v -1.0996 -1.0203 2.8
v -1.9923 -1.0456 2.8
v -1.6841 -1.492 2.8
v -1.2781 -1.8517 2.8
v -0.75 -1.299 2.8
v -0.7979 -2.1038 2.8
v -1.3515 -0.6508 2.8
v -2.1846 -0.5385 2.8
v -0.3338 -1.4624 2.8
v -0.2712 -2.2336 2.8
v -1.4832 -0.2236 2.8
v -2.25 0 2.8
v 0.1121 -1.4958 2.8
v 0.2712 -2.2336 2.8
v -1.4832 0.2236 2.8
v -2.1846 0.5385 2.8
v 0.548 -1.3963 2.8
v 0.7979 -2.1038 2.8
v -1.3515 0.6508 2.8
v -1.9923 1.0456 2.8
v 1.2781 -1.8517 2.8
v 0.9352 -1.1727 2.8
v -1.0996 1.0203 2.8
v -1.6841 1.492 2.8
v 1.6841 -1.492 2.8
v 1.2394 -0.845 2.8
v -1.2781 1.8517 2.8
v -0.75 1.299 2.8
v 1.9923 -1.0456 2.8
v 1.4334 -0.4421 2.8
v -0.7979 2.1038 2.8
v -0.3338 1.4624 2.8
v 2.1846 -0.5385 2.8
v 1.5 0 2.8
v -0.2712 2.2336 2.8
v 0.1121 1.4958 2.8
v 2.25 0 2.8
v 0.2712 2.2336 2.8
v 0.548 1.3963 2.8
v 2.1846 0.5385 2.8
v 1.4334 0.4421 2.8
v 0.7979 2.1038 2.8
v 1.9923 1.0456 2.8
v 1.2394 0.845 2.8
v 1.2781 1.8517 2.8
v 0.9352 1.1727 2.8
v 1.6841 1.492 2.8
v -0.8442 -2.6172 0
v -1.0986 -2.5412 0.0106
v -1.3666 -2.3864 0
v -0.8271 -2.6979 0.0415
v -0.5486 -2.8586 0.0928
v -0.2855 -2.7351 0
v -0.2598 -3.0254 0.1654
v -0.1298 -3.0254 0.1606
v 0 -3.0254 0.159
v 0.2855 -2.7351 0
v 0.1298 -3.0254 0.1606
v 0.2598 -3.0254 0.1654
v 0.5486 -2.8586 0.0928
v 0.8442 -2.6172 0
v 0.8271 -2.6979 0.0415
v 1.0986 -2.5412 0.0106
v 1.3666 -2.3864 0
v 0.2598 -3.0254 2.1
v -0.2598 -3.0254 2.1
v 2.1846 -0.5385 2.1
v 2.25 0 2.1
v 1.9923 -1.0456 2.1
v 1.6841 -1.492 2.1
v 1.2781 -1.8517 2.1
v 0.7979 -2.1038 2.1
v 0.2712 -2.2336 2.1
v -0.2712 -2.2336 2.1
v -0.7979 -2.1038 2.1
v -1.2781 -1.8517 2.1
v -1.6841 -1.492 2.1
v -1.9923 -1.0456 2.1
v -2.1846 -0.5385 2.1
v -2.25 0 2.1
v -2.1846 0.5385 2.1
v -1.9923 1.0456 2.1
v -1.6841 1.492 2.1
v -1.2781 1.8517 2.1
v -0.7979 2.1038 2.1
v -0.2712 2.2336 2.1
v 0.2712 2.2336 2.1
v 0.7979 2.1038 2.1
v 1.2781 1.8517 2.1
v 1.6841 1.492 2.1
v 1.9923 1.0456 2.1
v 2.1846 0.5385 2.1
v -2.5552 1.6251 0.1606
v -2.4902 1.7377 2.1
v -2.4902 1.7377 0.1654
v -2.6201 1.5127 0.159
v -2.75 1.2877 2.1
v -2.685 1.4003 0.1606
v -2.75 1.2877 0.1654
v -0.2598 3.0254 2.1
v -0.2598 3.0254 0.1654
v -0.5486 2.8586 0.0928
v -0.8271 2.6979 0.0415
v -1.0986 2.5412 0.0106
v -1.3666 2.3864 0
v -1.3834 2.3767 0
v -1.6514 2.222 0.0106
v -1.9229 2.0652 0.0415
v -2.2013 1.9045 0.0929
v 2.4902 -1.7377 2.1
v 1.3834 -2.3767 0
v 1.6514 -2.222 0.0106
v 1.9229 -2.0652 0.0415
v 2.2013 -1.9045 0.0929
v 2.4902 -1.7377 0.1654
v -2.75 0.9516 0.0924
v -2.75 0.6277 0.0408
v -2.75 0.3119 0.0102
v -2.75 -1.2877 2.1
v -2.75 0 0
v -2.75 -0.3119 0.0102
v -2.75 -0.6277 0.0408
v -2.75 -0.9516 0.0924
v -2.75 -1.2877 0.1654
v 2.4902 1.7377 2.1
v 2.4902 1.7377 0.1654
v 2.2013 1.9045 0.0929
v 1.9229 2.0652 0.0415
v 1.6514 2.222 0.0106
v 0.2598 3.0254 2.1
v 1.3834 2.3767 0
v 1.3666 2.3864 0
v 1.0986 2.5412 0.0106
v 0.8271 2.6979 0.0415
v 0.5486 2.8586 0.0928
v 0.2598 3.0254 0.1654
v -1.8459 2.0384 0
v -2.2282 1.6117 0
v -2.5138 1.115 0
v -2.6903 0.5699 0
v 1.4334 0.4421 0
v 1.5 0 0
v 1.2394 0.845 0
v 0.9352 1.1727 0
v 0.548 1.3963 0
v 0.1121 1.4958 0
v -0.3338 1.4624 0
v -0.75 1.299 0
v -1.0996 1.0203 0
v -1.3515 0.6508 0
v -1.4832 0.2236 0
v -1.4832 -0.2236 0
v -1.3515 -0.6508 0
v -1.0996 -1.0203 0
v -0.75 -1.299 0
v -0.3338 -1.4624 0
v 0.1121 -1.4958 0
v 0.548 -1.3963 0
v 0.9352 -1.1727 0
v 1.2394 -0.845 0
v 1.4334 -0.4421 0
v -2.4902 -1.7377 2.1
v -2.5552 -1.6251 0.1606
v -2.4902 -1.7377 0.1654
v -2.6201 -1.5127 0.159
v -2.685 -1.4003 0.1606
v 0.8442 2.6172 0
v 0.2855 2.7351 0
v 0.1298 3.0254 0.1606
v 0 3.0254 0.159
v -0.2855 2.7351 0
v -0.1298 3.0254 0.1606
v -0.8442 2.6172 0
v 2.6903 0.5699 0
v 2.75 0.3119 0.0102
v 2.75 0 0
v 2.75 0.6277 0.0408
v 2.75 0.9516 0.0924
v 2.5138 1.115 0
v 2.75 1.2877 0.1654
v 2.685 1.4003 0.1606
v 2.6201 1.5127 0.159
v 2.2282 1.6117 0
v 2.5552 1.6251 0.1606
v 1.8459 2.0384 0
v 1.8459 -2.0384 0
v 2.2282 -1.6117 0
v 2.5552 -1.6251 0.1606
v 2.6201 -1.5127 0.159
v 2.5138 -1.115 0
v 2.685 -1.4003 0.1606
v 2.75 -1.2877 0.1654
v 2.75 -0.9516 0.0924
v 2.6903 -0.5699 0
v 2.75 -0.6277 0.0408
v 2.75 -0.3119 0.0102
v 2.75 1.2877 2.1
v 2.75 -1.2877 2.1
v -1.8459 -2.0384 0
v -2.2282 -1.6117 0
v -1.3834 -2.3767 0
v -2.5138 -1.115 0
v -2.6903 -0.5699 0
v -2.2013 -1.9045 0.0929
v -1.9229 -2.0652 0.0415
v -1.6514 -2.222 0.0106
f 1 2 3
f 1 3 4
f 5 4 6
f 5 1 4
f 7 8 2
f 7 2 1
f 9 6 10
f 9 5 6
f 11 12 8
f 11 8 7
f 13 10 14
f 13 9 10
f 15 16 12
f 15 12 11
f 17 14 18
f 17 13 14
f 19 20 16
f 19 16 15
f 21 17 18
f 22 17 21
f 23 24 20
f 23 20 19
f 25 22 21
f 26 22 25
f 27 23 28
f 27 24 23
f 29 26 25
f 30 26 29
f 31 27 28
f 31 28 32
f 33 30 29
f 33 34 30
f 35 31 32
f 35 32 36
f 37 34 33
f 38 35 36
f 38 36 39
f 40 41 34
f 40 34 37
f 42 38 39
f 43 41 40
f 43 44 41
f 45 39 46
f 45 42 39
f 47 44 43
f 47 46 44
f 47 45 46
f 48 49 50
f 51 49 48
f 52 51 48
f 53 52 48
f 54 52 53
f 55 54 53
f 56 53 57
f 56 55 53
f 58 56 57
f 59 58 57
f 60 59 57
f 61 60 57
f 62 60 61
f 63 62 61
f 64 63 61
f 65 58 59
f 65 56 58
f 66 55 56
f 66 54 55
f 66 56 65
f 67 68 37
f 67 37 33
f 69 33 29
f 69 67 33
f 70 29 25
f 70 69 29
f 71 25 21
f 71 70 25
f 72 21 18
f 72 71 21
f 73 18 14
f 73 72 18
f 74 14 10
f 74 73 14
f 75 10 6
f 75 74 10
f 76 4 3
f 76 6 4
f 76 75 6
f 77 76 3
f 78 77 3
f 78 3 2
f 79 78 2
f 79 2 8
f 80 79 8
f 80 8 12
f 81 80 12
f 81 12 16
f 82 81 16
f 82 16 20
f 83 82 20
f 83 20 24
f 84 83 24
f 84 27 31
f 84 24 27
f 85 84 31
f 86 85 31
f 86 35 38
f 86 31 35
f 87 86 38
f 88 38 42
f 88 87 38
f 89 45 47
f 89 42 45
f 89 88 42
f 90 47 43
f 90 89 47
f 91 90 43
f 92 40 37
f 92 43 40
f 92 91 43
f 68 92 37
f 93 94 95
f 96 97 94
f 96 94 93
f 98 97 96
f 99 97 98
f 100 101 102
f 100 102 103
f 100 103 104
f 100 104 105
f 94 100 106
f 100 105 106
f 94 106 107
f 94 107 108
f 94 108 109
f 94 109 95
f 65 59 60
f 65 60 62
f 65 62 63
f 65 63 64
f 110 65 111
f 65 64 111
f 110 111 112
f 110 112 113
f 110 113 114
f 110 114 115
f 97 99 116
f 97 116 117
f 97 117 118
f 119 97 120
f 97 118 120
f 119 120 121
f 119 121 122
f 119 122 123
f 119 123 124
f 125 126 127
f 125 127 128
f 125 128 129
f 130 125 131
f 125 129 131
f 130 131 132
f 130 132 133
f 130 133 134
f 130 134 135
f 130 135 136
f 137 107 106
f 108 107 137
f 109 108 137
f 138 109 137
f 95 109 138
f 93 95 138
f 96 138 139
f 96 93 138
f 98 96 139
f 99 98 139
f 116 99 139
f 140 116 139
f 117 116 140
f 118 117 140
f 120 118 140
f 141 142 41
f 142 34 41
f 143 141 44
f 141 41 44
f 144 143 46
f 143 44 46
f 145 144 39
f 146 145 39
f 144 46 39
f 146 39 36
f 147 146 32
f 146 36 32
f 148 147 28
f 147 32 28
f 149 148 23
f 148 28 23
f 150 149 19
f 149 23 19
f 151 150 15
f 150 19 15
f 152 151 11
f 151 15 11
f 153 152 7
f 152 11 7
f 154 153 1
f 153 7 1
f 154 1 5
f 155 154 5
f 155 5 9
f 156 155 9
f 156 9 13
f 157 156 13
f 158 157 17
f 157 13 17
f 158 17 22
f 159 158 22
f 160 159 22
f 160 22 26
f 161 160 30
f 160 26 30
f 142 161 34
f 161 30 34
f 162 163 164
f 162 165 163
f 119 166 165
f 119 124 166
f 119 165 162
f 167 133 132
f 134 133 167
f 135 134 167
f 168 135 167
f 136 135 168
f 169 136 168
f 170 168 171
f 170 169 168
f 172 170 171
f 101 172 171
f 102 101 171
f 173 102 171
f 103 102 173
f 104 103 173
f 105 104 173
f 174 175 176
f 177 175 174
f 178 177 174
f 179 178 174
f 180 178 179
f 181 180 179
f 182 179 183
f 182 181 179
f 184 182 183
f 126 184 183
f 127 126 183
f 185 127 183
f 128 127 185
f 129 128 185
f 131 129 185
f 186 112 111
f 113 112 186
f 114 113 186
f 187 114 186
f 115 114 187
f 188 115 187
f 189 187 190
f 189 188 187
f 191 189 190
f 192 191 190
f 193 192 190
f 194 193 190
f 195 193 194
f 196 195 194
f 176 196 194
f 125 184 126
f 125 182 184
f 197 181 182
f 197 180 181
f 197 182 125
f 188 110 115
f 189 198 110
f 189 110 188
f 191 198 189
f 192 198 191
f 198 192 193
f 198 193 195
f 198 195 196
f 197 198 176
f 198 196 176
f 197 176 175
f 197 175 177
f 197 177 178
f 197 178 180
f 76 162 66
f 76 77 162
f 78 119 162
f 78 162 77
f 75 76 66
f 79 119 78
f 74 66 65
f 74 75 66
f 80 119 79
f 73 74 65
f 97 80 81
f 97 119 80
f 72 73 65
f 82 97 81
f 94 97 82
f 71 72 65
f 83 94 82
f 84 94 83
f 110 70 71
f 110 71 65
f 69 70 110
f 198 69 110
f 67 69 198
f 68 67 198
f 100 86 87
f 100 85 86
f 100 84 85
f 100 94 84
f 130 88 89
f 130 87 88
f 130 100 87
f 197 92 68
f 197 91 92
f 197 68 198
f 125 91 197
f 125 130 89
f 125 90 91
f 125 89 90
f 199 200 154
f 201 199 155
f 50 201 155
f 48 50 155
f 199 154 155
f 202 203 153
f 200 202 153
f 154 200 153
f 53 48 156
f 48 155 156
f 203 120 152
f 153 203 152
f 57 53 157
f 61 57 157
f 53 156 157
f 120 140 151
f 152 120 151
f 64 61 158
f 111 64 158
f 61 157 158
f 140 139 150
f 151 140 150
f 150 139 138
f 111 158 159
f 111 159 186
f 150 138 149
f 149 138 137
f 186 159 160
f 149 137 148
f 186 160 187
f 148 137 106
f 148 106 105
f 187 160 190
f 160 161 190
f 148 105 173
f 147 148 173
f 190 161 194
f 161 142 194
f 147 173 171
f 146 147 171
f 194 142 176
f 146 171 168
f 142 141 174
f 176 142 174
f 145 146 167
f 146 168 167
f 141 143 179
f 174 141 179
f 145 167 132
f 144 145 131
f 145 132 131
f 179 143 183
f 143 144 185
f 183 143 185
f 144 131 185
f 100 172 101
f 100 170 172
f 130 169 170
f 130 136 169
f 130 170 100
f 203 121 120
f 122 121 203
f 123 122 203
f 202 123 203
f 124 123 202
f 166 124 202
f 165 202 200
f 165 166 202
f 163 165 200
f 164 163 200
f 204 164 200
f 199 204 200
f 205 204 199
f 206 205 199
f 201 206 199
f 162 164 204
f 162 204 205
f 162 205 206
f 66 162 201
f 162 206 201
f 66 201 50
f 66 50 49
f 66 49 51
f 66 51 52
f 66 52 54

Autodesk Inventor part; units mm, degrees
ref_plane "YZ Plane" through (0, 0, 0) normal (1, 0, 0) x (0, 1, 0)
ref_plane "XZ Plane" through (0, 0, 0) normal (0, 1, 0) x (-1, 0, 0)
ref_plane "XY Plane" through (0, 0, 0) normal (0, 0, 1) x (1, 0, 0)
sketch "スケッチ1" plane through (0, 0, 0) normal (0, 1, 0) x (-1, 0, 0)
  line L0 (-1.5, 0) -> (-1.5, 2.8)
  line L1 (-1.5, 2.8) -> (-2.25, 2.8)
  line L2 (-2.25, 2.8) -> (-2.25, 2.1)
  line L3 (-2.25, 2.1) -> (-3.1754, 2.1)
  line L4 (-3.1754, 2.1) -> (-3.1754, 0.2456)
  line L5 (-2.75, 0) -> (-1.5, 0)
  line L6 (-3.1754, 0.2456) -> (-2.75, 0)
  line L7 (0, -0.56) -> (0, 3.36) projected
  point P0 (0, 0)
  dimension "d0" = 2.75
  dimension "d1" = 3.1754
  dimension "d2" = 30
  dimension "d3" = 0.7
  dimension "d4" = 2.8
  dimension "d5" = 3
  dimension "d6" = 4.5
revolve "回転1" add sketch "スケッチ1" angle 360 about axis through (0, 0, -10) along (0, 0, 1)
sketch "スケッチ2" plane through (0, 0, 0) normal (0, 0, -1) x (-1, 0, 0)
  circle A0 centre (0, 0) radius 3.1754 projected
  line L0 (0, 3.1754) -> (2.75, 1.5877)
  line L1 (2.75, 1.5877) -> (2.75, -1.5877)
  line L2 (2.75, -1.5877) -> (0, -3.1754)
  line L3 (0, -3.1754) -> (-2.75, -1.5877)
  line L4 (-2.75, -1.5877) -> (-2.75, 1.5877)
  line L5 (-2.75, 1.5877) -> (0, 3.1754)
  point P0 (0, -3.1754)
  point P1 (0, -3.1754)
extrude "押し出し1" cut sketch "スケッチ2" against normal through all contours A0 L1 | L0 A0 | A0 L2 | L5 A0 | A0 L3 | L4 A0
chamfer "面取り1" distance 0.3 angle 45 6 edges at (0, 3.1754, 1.1728) (-2.75, 1.5877, 1.1728) (2.75, 1.5877, 1.1728) (2.75, -1.5877, 1.1728) (0, -3.1754, 1.1728) (-2.75, -1.5877, 1.1728)
thread "ねじ1" size "M3x0.5" class "6H" standard "ANSI Metric M Profile" full length
equation "\"d1\" = 1.1547 * d0"
properties part number "S3-07-3W" material "チタン"
